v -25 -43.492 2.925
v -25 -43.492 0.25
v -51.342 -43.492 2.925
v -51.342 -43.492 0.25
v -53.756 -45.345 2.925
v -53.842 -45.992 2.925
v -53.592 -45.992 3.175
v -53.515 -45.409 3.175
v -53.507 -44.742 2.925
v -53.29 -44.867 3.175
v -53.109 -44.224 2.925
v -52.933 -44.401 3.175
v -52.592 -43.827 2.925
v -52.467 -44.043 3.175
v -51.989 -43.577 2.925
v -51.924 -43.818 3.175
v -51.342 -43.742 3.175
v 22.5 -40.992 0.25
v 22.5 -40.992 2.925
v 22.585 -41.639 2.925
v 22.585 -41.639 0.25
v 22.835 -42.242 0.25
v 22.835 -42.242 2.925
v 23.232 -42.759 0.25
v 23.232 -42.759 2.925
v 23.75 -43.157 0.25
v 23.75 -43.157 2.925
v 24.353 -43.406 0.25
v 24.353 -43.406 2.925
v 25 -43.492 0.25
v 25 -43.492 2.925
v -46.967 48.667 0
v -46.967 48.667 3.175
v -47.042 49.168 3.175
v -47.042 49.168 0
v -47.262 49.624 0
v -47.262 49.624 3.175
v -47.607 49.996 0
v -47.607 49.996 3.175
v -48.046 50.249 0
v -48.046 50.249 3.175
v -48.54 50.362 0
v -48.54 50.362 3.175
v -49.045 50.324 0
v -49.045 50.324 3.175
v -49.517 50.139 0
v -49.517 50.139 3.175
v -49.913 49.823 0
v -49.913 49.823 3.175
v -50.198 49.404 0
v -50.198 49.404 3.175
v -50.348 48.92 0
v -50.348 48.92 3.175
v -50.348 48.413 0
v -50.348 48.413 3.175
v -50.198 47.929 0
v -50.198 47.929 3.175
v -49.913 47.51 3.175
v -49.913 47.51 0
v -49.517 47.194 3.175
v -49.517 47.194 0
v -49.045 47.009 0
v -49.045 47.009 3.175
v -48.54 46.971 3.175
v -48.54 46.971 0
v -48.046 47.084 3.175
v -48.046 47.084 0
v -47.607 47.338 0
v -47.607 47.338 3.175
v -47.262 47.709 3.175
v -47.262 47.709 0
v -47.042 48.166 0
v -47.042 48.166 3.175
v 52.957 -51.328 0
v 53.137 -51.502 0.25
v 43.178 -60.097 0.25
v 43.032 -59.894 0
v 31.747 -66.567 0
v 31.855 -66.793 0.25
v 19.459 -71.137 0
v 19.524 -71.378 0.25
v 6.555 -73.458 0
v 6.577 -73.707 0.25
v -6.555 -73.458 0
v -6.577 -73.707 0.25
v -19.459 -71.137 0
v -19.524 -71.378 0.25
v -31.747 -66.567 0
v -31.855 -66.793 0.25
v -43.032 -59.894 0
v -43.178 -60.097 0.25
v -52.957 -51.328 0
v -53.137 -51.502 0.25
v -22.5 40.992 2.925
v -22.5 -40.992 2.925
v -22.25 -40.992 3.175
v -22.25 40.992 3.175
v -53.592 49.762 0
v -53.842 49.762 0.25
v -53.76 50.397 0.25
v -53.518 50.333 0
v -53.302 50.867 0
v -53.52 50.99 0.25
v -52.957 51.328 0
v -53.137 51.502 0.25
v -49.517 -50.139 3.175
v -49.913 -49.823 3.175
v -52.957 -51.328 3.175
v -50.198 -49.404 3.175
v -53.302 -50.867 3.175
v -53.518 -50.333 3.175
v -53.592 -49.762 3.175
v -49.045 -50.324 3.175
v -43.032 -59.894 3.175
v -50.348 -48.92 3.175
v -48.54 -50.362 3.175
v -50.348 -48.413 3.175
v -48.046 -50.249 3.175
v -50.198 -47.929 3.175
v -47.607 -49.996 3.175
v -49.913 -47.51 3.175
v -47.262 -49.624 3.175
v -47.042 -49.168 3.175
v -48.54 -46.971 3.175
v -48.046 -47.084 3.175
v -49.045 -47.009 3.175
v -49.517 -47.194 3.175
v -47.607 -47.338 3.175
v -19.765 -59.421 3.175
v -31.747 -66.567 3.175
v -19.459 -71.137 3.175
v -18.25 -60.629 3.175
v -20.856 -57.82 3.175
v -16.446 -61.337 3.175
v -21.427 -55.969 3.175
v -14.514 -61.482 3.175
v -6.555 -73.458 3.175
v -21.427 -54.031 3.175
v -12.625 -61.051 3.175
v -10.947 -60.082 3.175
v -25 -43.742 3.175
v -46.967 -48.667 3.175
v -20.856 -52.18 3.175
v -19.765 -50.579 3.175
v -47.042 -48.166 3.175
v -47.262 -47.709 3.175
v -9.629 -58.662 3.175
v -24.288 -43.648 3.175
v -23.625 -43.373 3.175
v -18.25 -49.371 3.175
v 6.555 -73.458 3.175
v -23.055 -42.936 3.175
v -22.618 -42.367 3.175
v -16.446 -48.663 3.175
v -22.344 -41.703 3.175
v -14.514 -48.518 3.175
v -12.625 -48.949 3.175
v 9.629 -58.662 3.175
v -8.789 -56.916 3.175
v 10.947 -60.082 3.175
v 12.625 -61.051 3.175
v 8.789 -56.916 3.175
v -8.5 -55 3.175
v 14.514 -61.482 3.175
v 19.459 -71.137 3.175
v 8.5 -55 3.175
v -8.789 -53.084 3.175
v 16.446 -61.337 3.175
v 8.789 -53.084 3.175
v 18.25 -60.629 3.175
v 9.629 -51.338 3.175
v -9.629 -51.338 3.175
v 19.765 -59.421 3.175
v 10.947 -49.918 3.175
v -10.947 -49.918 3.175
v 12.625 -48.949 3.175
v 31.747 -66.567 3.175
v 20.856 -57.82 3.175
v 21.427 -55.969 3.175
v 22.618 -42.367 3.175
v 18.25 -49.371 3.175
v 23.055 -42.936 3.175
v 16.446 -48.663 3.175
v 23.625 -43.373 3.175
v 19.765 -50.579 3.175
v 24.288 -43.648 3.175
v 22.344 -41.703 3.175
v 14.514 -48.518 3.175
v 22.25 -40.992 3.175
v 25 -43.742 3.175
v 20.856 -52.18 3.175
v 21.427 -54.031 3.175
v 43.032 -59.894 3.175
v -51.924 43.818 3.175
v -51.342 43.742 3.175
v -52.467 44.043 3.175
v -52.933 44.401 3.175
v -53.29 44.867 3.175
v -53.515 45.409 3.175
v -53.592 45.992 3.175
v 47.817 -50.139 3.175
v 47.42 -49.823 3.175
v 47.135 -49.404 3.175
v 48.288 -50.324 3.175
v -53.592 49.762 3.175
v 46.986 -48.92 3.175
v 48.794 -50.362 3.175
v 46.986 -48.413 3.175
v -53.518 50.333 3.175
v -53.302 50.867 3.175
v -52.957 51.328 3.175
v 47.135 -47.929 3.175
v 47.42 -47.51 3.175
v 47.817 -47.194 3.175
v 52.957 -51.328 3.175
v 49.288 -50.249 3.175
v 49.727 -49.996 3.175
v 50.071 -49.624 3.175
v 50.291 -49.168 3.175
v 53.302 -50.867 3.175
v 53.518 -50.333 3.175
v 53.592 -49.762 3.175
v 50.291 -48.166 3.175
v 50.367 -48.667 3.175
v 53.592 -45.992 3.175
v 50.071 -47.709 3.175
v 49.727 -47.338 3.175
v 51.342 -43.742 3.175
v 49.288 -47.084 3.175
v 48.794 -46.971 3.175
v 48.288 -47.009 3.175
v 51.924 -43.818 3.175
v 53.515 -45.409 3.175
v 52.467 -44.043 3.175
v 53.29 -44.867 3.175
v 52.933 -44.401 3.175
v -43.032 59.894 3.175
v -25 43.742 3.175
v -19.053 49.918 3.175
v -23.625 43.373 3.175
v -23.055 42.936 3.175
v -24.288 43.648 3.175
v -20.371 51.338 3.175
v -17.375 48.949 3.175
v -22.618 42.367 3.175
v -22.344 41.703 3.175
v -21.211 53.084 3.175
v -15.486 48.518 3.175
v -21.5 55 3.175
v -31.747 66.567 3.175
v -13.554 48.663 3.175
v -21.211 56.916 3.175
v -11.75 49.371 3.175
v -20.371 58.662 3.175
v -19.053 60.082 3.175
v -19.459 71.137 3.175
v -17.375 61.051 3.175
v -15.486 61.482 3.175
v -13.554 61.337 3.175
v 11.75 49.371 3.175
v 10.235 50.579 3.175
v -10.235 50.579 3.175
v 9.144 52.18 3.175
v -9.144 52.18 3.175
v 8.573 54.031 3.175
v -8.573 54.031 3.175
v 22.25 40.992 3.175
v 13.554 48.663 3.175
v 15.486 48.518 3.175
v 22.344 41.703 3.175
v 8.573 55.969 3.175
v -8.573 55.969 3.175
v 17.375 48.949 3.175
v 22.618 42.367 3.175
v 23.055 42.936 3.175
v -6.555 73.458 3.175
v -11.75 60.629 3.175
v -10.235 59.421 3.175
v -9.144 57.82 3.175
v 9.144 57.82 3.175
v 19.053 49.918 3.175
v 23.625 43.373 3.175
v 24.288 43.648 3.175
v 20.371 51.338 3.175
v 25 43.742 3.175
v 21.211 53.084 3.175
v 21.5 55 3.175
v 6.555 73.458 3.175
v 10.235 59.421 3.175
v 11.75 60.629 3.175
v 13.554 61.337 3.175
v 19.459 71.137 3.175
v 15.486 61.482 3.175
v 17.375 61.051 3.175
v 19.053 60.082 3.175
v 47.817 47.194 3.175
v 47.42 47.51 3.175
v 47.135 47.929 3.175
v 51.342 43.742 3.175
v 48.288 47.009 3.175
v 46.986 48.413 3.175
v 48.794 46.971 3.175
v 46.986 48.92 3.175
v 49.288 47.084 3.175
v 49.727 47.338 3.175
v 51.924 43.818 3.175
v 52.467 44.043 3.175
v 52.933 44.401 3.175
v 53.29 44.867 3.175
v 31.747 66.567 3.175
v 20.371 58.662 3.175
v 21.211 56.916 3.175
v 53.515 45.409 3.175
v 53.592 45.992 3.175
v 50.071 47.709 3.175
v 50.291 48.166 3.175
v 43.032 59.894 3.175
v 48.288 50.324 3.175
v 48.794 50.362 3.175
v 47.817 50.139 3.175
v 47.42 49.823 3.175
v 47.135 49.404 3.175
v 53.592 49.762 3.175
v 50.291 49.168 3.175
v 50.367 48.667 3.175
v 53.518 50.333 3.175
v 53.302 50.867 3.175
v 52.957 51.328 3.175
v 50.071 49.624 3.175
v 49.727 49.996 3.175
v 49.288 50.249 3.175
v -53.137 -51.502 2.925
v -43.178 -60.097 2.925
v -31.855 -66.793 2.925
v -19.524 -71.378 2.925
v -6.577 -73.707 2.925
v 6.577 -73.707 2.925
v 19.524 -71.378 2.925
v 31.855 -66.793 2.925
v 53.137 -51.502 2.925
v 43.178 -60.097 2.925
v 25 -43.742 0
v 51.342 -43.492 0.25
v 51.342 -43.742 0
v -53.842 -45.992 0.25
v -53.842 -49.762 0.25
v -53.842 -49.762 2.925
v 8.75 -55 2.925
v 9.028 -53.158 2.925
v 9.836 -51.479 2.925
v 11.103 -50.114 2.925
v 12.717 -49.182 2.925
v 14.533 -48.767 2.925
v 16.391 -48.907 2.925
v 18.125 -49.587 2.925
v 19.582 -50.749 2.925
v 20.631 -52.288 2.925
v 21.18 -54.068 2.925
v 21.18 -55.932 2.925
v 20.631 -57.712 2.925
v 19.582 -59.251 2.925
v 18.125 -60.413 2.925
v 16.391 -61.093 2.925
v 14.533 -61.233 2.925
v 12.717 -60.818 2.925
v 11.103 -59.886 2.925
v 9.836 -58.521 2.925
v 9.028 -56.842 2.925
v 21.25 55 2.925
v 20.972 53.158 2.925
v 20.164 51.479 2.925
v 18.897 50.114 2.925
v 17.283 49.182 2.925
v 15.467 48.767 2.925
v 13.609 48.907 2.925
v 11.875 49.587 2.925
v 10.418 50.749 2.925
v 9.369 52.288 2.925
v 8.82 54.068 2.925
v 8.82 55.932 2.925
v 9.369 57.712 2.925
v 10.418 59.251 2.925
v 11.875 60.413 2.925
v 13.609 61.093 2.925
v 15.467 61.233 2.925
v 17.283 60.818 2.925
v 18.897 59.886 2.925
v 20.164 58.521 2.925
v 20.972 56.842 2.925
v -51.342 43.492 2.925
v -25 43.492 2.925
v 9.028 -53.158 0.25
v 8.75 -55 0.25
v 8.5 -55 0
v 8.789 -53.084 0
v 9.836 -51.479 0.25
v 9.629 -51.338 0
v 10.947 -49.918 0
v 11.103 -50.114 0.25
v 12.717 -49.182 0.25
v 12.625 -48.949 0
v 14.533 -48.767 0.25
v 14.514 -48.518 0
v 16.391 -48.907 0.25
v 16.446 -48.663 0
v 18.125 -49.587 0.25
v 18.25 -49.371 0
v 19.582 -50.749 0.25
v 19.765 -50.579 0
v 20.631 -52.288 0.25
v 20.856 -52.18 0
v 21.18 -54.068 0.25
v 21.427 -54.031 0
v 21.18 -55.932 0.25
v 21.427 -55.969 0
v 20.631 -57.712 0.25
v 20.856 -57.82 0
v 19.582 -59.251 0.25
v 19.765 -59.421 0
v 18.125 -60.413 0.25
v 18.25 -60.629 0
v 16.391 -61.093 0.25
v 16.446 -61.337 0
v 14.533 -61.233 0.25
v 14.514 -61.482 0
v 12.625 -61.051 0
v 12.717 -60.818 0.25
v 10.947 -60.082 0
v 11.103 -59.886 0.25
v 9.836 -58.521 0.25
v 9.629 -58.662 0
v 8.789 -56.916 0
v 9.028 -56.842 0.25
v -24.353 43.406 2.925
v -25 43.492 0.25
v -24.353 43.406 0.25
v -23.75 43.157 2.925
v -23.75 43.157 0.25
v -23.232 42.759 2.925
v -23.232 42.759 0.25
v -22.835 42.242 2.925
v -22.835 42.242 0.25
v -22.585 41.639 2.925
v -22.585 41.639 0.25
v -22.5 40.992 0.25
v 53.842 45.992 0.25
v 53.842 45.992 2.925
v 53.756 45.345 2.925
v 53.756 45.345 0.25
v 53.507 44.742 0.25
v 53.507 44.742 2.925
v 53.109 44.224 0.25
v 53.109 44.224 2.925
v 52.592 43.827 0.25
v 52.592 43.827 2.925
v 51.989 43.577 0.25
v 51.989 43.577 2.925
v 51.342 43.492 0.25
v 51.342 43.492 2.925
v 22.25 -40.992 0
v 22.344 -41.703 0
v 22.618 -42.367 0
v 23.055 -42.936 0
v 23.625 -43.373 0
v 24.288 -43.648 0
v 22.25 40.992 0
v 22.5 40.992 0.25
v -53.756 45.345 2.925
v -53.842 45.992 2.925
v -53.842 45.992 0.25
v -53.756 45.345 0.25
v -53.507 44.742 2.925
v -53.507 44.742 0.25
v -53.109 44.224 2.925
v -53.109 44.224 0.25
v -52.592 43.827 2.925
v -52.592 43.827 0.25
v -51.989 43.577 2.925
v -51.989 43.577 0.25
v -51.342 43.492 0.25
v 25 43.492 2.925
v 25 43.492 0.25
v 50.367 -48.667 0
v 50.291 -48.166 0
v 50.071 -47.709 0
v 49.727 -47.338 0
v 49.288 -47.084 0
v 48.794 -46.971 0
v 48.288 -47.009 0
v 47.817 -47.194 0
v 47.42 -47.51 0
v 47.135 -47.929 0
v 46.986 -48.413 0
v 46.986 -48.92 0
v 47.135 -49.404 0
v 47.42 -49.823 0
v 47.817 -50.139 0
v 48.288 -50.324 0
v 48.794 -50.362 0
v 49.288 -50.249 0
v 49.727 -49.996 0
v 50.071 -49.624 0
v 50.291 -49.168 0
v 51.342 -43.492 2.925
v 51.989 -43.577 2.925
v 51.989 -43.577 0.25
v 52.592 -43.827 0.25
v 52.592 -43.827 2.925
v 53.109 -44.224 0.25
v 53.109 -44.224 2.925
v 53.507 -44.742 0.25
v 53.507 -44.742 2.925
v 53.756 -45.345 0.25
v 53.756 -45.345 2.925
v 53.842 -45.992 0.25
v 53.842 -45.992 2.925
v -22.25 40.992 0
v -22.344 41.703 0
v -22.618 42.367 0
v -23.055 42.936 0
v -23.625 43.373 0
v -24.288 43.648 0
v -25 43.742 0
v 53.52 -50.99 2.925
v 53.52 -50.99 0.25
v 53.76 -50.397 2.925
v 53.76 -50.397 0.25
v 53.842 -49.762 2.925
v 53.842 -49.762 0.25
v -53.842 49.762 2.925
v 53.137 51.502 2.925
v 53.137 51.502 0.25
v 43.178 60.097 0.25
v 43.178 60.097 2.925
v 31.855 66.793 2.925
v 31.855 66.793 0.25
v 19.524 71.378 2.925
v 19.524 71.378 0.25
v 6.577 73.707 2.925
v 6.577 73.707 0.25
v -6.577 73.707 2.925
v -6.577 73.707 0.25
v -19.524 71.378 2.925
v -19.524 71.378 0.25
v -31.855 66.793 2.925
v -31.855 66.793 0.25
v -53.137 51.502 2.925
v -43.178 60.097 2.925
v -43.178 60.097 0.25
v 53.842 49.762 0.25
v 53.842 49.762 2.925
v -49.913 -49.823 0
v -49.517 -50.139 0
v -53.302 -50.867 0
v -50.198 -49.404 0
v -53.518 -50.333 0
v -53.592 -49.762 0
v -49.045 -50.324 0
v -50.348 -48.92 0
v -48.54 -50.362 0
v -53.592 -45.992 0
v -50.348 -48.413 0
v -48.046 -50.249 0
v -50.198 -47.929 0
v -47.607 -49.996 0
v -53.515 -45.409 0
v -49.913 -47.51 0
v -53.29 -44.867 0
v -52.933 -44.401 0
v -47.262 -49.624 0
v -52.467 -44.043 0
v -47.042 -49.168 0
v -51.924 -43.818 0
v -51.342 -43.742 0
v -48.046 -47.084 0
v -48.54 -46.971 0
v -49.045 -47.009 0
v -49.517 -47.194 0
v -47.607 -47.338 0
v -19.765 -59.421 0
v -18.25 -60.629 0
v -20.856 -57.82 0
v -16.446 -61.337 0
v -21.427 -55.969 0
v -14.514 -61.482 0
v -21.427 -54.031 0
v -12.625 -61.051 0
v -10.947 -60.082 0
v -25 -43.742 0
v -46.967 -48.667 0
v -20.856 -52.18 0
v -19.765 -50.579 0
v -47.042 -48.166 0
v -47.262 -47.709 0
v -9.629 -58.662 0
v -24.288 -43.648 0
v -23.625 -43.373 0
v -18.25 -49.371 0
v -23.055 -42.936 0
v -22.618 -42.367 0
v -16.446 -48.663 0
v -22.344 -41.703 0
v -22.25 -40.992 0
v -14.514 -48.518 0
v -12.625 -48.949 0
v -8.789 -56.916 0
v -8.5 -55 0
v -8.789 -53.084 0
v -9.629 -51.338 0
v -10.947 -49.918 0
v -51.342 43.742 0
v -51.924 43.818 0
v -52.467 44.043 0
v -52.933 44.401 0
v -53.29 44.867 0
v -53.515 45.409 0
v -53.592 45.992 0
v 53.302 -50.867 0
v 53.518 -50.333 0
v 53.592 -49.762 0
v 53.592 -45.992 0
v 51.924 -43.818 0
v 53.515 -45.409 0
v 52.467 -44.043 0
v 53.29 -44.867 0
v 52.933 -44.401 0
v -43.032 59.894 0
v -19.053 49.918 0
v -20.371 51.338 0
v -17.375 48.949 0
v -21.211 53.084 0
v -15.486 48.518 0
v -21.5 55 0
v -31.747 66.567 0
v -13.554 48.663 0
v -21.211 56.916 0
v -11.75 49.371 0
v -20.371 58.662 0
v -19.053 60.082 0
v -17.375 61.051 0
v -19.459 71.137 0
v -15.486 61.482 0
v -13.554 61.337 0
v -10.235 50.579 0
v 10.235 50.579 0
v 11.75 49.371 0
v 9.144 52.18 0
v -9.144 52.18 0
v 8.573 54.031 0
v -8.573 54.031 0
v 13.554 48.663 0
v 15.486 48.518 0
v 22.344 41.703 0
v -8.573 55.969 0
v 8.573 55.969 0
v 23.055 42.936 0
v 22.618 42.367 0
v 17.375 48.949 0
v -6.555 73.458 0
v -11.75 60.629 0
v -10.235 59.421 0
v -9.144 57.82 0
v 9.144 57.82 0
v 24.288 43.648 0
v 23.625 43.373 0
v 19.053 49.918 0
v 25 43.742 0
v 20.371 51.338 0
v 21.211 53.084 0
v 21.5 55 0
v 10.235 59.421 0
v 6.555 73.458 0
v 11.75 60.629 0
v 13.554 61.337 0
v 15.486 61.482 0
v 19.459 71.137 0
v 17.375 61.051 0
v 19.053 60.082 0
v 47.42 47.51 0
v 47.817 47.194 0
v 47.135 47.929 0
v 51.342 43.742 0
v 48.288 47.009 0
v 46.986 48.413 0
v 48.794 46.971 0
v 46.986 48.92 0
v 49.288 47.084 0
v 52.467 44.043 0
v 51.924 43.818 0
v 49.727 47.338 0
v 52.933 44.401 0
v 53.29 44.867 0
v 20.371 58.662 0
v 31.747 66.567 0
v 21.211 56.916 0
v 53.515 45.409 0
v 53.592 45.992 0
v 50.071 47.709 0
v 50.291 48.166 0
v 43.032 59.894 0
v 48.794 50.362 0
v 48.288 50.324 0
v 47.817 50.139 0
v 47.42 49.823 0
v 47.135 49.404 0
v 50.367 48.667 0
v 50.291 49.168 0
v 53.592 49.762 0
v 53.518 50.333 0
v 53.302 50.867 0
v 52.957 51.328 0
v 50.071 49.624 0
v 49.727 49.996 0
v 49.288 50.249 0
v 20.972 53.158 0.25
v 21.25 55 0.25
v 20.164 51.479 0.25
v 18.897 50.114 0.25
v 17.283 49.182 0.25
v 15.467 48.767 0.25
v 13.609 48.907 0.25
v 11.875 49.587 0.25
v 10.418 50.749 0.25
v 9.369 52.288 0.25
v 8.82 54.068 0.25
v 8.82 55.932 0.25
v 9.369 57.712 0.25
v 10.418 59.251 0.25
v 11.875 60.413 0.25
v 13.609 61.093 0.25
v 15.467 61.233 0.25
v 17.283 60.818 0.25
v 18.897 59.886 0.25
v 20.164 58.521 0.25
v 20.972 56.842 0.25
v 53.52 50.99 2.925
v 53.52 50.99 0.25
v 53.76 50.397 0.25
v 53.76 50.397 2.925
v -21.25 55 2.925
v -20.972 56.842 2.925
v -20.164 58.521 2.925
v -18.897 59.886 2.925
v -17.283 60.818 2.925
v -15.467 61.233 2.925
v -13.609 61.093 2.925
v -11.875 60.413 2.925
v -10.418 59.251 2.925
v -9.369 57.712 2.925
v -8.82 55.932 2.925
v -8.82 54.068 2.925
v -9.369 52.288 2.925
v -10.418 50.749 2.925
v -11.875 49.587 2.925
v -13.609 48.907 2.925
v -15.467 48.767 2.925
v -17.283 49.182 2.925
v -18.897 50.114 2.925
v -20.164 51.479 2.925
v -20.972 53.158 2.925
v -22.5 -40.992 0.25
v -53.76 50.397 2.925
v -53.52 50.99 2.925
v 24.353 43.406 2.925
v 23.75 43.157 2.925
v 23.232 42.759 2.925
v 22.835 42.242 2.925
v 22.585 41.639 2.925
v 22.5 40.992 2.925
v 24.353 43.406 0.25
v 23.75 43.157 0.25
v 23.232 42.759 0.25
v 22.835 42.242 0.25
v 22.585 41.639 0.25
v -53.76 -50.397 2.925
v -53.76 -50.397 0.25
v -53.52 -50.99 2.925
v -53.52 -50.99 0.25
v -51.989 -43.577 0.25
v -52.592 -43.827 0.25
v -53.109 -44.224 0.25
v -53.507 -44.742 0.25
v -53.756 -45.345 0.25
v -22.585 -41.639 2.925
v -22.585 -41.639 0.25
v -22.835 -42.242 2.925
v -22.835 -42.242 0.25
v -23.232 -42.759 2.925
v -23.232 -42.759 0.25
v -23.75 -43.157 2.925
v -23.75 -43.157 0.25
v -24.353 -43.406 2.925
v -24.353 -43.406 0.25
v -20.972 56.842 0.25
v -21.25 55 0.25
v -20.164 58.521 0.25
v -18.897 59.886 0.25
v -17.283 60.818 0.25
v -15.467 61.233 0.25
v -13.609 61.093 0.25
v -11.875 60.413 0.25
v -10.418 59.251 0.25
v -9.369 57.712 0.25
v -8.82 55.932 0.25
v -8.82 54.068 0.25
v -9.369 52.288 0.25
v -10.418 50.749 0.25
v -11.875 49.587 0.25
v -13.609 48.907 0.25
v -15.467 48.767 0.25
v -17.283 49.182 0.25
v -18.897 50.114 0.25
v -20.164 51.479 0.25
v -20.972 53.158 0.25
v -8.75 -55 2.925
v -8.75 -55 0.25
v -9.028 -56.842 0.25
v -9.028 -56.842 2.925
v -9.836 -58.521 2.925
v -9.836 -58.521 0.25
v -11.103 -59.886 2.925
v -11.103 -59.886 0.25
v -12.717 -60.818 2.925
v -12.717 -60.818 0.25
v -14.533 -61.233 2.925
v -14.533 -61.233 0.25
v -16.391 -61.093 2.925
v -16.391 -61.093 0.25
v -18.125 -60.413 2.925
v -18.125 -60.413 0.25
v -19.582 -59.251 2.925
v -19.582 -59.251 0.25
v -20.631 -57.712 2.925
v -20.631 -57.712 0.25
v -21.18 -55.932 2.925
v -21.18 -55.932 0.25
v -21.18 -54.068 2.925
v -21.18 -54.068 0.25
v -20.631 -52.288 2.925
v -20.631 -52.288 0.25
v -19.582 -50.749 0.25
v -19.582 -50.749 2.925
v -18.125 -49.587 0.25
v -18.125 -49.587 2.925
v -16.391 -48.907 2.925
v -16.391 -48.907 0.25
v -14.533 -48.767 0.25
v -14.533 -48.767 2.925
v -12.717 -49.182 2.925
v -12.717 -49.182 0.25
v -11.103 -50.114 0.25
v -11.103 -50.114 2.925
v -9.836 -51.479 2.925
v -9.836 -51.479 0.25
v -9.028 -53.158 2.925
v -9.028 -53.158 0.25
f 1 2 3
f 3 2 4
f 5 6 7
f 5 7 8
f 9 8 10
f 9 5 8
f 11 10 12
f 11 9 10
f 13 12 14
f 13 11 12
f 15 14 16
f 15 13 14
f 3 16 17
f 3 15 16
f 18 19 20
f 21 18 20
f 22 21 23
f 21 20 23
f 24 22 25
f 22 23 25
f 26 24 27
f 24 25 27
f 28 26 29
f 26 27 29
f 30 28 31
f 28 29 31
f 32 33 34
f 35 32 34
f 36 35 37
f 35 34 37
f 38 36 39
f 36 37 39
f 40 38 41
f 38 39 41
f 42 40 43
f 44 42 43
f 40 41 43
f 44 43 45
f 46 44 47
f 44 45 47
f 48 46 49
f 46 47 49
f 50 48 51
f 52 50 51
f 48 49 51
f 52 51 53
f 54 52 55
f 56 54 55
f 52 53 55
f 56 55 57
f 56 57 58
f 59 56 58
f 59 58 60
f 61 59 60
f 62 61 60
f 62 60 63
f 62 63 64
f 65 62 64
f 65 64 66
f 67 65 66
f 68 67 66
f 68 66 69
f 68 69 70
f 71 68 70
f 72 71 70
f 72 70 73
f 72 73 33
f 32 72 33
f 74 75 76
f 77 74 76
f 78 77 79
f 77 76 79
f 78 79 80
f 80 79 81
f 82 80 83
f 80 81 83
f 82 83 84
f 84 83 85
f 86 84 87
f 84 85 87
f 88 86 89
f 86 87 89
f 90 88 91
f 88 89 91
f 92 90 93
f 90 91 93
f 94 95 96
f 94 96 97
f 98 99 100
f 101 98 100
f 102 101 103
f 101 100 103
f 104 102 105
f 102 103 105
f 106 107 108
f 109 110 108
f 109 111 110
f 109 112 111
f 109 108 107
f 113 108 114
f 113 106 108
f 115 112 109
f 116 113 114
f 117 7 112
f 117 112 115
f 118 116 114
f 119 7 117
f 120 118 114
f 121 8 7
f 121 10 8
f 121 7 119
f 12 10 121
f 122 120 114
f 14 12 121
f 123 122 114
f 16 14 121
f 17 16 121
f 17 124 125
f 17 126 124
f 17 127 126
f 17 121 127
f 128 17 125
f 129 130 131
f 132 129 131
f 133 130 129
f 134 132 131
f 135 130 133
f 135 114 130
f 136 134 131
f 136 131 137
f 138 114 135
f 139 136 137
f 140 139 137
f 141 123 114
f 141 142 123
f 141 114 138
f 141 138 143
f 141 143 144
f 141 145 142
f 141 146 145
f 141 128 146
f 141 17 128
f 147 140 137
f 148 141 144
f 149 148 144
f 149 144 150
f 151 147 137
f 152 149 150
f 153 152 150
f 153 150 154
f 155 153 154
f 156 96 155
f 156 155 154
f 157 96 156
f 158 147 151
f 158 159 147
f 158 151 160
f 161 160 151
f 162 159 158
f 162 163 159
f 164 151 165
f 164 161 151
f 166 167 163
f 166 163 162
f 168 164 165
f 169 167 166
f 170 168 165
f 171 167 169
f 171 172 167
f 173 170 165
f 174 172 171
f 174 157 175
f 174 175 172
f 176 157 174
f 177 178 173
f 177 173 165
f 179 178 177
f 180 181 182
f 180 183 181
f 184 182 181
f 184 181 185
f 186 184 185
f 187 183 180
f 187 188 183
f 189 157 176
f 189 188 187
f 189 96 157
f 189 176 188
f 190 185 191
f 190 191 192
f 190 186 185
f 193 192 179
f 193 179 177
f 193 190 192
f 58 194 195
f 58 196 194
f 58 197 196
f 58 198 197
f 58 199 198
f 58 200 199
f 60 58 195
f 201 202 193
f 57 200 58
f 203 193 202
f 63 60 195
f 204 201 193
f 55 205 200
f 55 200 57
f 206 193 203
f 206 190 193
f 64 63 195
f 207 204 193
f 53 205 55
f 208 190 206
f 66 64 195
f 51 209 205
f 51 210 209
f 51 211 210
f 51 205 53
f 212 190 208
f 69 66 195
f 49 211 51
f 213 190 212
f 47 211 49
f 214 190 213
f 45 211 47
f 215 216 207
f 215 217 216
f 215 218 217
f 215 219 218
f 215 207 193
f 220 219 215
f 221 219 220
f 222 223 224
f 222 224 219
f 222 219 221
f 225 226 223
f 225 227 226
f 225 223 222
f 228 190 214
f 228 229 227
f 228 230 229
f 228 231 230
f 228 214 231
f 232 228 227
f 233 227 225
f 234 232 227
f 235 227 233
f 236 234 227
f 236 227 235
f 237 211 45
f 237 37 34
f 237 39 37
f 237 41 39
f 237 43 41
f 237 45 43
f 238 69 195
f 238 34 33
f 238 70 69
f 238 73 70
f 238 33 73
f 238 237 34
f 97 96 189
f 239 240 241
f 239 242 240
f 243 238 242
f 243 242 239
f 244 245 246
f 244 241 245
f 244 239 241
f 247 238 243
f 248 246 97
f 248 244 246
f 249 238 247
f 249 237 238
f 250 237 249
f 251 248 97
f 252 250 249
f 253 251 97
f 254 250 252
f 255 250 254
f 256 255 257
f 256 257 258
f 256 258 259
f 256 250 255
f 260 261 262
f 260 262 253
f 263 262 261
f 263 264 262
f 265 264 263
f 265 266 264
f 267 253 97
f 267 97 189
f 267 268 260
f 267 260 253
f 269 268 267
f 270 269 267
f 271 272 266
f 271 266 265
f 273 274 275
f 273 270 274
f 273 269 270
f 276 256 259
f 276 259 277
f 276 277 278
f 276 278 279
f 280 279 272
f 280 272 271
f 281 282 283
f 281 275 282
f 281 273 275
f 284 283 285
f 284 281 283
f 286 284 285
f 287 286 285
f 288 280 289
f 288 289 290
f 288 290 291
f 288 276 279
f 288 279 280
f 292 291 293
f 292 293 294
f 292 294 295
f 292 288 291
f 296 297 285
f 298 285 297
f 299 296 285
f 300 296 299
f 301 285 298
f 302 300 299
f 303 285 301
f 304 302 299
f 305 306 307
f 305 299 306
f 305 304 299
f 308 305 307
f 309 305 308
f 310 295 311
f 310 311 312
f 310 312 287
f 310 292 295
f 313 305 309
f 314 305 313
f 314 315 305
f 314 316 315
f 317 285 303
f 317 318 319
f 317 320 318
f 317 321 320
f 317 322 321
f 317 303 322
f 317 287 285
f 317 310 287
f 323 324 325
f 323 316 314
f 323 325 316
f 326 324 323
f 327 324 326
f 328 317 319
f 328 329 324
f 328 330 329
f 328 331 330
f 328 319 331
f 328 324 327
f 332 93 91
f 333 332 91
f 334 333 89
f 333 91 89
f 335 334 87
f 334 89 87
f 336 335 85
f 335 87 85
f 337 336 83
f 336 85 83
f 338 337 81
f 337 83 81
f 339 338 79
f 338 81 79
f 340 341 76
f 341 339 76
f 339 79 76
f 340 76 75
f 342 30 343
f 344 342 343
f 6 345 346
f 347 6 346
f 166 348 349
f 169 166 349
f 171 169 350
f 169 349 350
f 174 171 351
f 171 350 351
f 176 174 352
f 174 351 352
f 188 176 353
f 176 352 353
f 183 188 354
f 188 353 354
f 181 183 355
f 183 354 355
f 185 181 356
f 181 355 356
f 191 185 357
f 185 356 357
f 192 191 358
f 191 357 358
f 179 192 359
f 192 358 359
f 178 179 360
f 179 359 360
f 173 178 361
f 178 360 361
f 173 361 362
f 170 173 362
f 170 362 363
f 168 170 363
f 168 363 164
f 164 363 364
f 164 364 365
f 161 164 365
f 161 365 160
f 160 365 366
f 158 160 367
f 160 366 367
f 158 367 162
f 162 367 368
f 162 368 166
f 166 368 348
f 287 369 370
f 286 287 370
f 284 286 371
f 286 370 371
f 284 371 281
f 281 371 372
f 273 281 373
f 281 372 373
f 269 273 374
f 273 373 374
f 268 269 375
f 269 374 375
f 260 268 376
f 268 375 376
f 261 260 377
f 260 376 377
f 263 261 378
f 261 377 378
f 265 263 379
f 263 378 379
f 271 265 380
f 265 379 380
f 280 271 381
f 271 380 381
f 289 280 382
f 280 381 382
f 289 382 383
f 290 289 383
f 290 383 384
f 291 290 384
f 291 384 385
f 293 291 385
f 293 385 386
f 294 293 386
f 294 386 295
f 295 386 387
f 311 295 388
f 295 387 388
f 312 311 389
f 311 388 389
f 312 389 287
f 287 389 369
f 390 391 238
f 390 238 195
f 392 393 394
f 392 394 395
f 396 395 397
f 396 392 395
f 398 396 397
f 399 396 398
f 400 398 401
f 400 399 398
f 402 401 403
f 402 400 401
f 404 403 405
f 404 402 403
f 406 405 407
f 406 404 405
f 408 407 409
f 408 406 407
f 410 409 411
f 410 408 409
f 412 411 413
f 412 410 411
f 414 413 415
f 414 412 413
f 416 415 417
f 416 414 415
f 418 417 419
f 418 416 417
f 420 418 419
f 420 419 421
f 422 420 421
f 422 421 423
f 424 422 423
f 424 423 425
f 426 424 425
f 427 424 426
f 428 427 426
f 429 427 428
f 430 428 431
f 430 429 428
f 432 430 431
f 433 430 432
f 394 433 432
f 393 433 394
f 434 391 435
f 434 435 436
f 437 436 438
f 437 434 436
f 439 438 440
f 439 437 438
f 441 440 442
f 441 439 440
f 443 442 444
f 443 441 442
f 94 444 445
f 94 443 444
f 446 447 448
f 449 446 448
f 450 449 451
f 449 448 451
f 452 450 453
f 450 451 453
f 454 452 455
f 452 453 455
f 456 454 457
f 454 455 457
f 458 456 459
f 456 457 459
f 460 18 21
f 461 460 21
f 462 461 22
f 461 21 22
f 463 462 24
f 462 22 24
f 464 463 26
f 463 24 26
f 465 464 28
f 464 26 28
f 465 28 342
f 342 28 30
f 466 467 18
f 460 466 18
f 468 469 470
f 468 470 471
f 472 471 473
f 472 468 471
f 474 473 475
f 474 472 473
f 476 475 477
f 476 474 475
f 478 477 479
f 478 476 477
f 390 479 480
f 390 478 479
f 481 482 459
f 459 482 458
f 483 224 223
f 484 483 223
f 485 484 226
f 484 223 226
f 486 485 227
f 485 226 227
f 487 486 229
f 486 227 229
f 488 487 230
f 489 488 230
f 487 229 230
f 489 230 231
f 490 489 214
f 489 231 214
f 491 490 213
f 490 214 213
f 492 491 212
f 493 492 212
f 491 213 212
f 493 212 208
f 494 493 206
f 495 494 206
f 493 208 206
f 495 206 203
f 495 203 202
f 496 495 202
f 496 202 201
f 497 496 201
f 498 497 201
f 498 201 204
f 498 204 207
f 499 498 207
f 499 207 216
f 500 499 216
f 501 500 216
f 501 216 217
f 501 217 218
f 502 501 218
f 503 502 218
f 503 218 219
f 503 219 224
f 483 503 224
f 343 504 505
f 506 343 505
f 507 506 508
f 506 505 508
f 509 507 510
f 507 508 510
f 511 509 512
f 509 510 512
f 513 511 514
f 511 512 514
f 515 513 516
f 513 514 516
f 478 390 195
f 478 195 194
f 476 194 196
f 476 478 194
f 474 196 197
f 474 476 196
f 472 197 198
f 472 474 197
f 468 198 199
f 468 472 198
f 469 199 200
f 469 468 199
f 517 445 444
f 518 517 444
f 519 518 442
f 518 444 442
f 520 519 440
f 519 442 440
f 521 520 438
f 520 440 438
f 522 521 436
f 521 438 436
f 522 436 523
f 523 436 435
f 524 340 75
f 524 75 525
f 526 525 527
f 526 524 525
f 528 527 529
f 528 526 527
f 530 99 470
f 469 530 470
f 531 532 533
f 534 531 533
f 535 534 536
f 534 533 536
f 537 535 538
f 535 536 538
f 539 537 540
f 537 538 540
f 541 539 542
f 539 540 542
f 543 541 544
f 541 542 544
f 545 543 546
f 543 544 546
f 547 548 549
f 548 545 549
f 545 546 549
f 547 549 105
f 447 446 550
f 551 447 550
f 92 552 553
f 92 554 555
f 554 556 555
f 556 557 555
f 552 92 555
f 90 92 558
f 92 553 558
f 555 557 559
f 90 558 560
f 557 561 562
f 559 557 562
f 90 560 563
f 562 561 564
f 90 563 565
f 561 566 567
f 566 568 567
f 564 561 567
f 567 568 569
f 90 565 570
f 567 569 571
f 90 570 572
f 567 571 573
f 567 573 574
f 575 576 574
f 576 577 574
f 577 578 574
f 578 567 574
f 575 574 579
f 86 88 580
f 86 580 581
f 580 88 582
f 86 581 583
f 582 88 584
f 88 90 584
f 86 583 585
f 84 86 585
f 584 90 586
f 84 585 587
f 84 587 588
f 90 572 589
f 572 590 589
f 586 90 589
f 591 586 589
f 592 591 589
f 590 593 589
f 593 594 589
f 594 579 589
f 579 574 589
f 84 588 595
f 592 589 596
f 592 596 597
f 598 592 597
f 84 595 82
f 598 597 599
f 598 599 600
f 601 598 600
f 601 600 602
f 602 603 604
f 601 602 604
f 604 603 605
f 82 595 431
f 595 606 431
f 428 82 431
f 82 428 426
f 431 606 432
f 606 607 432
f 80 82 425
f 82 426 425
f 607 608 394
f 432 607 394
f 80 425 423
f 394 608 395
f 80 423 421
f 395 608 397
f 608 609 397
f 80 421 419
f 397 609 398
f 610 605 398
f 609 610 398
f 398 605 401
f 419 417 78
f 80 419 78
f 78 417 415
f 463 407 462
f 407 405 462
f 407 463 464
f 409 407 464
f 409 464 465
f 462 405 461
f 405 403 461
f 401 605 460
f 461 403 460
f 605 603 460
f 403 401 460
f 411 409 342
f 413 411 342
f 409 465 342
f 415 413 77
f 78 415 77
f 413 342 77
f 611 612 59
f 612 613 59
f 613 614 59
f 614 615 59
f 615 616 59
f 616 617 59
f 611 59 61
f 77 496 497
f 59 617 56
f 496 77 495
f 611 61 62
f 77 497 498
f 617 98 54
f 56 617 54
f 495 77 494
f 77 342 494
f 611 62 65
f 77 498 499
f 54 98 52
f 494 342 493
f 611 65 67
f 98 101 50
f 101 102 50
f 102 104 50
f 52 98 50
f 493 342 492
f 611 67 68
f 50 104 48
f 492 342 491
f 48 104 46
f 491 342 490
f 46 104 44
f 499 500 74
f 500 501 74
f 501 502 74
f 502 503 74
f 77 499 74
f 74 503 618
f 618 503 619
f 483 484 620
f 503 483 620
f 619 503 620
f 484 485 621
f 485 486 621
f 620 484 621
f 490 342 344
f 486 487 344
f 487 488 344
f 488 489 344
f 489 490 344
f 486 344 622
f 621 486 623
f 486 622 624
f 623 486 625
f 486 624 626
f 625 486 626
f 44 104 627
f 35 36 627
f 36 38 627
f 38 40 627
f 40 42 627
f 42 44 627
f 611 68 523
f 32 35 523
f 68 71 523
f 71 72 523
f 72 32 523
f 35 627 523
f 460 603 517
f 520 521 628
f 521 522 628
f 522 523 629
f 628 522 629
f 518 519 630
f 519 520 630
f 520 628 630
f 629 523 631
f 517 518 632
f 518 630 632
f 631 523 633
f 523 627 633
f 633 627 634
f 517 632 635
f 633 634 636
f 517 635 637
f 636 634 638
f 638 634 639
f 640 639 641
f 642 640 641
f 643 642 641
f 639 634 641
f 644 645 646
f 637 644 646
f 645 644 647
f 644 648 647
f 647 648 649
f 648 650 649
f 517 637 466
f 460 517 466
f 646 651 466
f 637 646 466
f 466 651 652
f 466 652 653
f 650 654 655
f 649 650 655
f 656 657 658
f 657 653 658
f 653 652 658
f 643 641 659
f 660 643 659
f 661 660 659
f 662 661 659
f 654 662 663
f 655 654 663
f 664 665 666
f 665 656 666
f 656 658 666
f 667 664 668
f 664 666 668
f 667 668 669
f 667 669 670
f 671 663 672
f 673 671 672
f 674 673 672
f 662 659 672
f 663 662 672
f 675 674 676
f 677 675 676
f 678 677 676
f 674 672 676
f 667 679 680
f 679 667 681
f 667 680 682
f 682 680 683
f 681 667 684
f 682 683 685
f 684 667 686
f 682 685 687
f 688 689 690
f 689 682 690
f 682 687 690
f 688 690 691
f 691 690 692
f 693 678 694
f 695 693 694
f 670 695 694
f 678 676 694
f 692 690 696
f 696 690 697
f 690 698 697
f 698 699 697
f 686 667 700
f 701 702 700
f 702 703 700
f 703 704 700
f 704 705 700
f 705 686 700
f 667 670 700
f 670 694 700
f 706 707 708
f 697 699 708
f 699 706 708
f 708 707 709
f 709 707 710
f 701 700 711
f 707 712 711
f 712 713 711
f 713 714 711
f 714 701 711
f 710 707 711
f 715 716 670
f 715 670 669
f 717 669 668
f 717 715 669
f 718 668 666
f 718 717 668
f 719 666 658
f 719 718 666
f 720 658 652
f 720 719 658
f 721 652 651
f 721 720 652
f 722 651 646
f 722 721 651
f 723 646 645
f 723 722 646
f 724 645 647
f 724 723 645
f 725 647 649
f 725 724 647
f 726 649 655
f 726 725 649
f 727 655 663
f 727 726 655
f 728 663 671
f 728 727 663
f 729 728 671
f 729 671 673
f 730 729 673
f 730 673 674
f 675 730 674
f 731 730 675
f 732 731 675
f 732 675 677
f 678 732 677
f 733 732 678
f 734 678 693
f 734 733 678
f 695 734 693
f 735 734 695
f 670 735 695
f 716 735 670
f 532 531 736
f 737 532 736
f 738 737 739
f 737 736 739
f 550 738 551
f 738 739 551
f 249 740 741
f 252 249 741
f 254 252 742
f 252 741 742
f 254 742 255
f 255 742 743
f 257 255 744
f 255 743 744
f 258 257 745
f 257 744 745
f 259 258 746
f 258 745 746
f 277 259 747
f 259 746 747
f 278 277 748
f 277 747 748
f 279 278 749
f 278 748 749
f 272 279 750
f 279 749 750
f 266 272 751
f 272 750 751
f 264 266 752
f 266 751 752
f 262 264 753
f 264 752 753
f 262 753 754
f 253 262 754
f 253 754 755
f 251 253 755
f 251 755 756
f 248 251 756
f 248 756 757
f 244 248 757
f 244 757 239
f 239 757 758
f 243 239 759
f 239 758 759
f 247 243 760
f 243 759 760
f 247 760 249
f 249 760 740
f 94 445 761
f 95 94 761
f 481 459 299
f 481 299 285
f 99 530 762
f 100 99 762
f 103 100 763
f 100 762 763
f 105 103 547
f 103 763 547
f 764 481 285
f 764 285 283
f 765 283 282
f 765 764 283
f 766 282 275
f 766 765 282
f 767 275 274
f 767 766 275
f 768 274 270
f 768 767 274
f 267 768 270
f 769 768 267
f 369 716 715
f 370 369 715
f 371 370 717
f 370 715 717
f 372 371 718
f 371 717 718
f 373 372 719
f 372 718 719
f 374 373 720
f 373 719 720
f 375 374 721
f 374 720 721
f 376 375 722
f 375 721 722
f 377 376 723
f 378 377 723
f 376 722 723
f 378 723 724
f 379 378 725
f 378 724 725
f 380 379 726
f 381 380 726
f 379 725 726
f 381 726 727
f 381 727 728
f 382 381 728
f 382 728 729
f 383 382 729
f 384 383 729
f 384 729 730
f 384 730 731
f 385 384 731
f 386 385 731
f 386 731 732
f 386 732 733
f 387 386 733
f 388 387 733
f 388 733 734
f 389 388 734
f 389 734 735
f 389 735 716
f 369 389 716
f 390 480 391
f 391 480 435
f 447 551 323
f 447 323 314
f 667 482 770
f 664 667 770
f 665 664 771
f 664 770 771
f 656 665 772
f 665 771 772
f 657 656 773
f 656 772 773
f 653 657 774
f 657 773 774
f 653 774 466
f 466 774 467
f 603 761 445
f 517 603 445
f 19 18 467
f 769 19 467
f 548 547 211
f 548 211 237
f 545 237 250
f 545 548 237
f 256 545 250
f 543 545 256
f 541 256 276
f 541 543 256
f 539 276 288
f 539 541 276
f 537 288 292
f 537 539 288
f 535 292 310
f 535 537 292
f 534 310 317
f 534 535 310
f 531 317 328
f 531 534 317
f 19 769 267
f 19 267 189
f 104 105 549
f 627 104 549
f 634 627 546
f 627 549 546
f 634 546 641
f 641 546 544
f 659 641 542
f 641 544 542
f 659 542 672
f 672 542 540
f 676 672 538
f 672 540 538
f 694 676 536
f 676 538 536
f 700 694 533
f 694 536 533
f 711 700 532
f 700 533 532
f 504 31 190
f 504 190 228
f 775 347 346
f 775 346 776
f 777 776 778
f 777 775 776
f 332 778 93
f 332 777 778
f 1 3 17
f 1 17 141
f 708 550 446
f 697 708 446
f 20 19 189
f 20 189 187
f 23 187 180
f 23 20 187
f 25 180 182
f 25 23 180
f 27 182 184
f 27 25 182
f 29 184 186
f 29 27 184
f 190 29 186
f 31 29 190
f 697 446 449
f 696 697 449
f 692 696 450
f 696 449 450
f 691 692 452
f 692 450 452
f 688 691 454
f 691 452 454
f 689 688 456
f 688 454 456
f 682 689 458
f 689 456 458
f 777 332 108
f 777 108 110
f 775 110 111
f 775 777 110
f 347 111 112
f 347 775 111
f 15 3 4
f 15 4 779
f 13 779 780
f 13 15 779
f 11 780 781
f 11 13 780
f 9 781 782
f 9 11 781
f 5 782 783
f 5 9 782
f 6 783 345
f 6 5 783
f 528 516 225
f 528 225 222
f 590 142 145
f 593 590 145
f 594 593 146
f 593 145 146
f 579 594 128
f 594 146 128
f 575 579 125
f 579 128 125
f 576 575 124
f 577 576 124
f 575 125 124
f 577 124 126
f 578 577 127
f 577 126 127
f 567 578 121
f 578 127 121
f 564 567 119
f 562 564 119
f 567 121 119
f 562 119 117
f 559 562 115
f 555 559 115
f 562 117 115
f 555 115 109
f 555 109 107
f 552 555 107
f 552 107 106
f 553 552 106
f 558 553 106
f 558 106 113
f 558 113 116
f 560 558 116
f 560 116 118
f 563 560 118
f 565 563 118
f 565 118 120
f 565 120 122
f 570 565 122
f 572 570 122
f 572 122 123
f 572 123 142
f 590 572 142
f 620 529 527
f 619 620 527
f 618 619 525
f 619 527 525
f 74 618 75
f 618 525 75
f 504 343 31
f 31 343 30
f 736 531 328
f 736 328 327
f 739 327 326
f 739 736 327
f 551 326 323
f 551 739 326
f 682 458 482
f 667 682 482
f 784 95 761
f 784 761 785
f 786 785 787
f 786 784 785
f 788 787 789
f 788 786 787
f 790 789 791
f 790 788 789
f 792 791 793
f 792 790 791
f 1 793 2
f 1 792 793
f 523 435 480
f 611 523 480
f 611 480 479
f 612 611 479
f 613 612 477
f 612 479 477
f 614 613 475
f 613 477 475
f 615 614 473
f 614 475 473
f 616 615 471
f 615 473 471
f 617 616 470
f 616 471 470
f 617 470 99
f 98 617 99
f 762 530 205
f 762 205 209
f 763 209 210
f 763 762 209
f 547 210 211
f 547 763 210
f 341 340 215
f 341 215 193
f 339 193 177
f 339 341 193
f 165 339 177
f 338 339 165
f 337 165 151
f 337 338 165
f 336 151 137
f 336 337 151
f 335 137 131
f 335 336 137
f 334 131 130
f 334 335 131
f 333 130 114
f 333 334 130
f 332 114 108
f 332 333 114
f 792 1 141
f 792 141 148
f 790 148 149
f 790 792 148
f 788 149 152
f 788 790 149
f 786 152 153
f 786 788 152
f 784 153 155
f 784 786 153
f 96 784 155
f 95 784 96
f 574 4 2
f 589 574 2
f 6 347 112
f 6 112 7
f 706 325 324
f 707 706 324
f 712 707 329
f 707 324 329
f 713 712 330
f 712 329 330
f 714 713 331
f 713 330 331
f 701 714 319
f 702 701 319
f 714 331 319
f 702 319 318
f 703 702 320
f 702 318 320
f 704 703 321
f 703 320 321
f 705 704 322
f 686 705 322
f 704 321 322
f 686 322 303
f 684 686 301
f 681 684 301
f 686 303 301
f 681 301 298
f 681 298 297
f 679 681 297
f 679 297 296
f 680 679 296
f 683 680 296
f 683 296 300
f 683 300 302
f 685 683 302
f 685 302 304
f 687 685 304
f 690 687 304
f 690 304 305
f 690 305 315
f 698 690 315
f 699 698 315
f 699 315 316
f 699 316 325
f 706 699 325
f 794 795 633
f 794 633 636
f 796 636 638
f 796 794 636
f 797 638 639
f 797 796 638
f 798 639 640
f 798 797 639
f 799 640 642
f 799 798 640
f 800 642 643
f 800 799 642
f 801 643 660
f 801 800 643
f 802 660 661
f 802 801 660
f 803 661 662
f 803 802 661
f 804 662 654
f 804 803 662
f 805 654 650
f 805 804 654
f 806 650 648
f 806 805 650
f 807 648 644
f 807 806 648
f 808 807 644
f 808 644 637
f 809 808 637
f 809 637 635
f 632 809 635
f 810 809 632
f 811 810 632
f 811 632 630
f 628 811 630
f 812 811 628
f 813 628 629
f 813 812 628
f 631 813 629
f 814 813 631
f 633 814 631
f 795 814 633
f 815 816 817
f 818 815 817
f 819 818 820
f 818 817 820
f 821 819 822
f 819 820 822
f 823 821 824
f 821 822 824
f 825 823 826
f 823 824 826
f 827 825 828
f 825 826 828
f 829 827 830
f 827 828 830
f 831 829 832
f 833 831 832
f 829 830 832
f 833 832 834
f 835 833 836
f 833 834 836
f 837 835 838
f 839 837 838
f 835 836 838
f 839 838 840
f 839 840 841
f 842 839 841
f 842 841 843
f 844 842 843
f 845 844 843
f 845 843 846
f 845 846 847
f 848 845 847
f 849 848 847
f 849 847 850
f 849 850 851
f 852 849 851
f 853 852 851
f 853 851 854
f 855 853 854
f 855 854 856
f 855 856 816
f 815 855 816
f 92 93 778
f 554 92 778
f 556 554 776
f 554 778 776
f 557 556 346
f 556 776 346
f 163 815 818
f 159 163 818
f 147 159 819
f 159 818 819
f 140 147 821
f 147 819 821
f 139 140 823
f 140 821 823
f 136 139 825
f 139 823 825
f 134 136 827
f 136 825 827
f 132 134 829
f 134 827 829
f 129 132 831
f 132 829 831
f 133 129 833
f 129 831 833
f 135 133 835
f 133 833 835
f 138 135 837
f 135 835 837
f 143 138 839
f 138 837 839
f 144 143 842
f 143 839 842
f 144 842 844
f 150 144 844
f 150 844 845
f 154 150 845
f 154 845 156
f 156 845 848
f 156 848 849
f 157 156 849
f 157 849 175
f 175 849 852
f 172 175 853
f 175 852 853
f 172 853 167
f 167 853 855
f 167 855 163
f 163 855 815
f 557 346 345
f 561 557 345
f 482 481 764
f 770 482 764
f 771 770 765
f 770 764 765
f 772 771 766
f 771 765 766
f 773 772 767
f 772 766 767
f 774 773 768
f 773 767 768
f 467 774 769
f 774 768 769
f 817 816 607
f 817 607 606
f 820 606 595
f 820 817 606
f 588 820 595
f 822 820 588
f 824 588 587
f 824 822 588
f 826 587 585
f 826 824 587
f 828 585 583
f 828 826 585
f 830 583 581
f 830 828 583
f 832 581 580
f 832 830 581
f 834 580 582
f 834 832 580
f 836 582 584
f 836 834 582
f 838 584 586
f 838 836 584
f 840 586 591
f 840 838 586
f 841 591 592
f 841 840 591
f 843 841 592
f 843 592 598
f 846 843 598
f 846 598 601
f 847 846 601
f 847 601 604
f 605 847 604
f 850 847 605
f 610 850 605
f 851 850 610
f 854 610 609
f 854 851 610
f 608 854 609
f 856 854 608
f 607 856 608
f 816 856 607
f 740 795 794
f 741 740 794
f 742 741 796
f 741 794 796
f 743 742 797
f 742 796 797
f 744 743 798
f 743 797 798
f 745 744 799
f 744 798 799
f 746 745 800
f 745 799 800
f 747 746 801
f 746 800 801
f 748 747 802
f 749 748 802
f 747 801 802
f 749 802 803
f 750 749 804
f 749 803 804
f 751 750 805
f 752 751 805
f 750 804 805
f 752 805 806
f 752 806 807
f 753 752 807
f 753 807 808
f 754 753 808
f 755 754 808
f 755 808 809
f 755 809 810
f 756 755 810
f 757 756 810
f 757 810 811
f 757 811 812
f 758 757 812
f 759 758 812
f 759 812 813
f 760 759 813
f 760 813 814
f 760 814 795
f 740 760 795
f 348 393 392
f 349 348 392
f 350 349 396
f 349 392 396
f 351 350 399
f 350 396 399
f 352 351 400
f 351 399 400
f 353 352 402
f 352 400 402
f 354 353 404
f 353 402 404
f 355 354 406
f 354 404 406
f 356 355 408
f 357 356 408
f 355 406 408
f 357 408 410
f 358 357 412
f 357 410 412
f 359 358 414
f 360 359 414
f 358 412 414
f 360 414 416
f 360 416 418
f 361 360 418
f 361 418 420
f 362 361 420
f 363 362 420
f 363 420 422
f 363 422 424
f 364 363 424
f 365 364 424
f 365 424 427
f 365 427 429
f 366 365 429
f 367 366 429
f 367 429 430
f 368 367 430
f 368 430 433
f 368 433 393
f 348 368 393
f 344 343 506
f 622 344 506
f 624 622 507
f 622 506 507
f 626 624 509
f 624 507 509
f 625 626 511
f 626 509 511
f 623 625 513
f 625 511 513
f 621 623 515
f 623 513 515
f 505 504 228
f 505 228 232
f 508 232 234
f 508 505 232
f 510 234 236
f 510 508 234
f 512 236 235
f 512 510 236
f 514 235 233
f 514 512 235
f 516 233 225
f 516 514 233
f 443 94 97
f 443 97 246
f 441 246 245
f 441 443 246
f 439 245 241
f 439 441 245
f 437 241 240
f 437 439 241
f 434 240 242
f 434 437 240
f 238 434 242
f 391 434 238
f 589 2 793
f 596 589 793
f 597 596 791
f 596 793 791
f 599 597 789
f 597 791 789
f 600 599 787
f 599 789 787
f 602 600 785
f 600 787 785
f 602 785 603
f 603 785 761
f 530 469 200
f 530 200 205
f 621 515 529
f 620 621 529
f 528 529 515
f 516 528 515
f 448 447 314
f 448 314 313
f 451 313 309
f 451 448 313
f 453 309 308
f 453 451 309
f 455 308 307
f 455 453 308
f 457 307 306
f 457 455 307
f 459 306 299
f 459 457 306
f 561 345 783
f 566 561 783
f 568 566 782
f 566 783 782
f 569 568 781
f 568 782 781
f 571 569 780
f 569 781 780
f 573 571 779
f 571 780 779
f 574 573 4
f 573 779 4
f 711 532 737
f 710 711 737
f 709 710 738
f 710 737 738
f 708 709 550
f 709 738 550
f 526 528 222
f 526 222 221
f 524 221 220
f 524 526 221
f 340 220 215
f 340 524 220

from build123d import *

# Parameters (mm, degrees)
BOSS_EXTRUDE1_DEPTH  = 3.175
M3_CLEARANCE_HOLE1_D = 3.4
SKETCH7_R            = 6.25
CUT_EXTRUDE3_DEPTH   = 92.569651758
FILLET1_R            = 2.5
CHAMFER1_SIZE        = 0.25


with BuildPart() as part:
    # Sketch1 → Boss-Extrude1 (new body)
    with BuildSketch(Plane.XY):
        with BuildLine():
            Line((-53.841624215, 50.764943631), (-53.841624215, 43.491624215))
            Line((-53.841624215, 43.491624215), (-22.5, 43.491624215))
            Line((-22.5, 43.491624215), (-22.5, -43.491624215))
            Line((-22.5, -43.491624215), (-53.841624215, -43.491624215))
            Line((-53.841624215, -43.491624215), (-53.841624215, -50.764943631))
            ThreePointArc((-53.841624215, -50.764943631), (0, -74), (53.841624215, -50.764943631))
            Line((53.841624215, -50.764943631), (53.841624215, -43.491624215))
            Line((53.841624215, -43.491624215), (22.5, -43.491624215))
            Line((22.5, -43.491624215), (22.5, 43.491624215))
            Line((22.5, 43.491624215), (53.841624215, 43.491624215))
            Line((53.841624215, 43.491624215), (53.841624215, 50.764943631))
            ThreePointArc((53.841624215, 50.764943631), (0, 74), (-53.841624215, 50.764943631))
        make_face()
    extrude(amount=BOSS_EXTRUDE1_DEPTH)

    # M3 Clearance Hole1 (through all)
    with Locations(Plane(origin=(48.666624215, 48.666624215, 0), x_dir=(-1, 0, 0), z_dir=(0, 0, -1))):
        with Locations((0, 0), (97.33324843, 0), (97.33324843, -97.33324843), (0, -97.33324843)):
            Hole(M3_CLEARANCE_HOLE1_D / 2)

    # Sketch7 → Cut-Extrude3 (cut, through all)
    with BuildSketch(Plane(origin=(0, 0, 0), x_dir=(-1, 0, 0), z_dir=(0, 0, -1))):
        with Locations((15, 55)):
            Circle(SKETCH7_R)
        with Locations(Location((-15, 55, 0), (0, 0, 180))):
            Circle(SKETCH7_R)
        with Locations((-15, -55)):
            Circle(SKETCH7_R)
        with Locations(Location((15, -55, 0), (0, 0, 180))):
            Circle(SKETCH7_R)
    extrude(amount=-CUT_EXTRUDE3_DEPTH, mode=Mode.SUBTRACT)

    # Fillet1
    fillet1_edges = [part.edges().sort_by_distance(p)[0] for p in [
        (53.841624215, 50.764943631, 1.5875),
        (53.841624215, 43.491624215, 1.5875),
        (22.5, 43.491624215, 1.5875),
        (22.5, -43.491624215, 1.5875),
        (53.841624215, -43.491624215, 1.5875),
        (53.841624215, -50.764943631, 1.5875),
        (-53.841624215, -50.764943631, 1.5875),
        (-53.841624215, -43.491624215, 1.5875),
        (-22.5, -43.491624215, 1.5875),
        (-22.5, 43.491624215, 1.5875),
        (-53.841624215, 43.491624215, 1.5875),
        (-53.841624215, 50.764943631, 1.5875),
    ]]
    fillet(fillet1_edges, radius=FILLET1_R)

    # Chamfer1
    chamfer1_edges = [part.edges().sort_by_distance(p)[0] for p in [
        (23.232233047, 42.759391168, 0),
        (23.232233047, 42.759391168, 3.175),
        (23.232233047, -42.759391168, 0),
        (23.232233047, -42.759391168, 3.175),
        (-23.232233047, -42.759391168, 0),
        (-23.232233047, -42.759391168, 3.175),
        (-23.232233047, 42.759391168, 0),
        (-23.232233047, 42.759391168, 3.175),
        (-21.25, -55, 3.175),
        (-21.25, -55, 0),
        (21.25, -55, 3.175),
        (21.25, -55, 0),
        (8.75, 55, 3.175),
        (8.75, 55, 0),
        (-8.75, 55, 3.175),
        (-8.75, 55, 0),
        (0, 74, 0),
        (0, 74, 3.175),
        (53.841624215, 47.876967743, 0),
        (38.170812108, 43.491624215, 0),
        (22.5, 0, 0),
        (38.170812108, -43.491624215, 0),
        (53.841624215, -47.876967743, 0),
        (0, -74, 0),
        (-53.841624215, -47.876967743, 0),
        (-38.170812108, -43.491624215, 0),
        (-22.5, 0, 0),
        (-38.170812108, 43.491624215, 0),
        (-53.841624215, 47.876967743, 0),
        (-53.65872415, -50.700952785, 0),
        (-53.65872415, 50.700952785, 0),
        (-53.109391168, 44.223857262, 0),
        (-53.109391168, -44.223857262, 0),
        (53.65872415, -50.700952785, 0),
        (53.109391168, -44.223857262, 0),
        (53.109391168, 44.223857262, 0),
        (53.65872415, 50.700952785, 0),
        (53.841624215, 47.876967743, 3.175),
        (-53.841624215, 47.876967743, 3.175),
        (-38.170812108, 43.491624215, 3.175),
        (-22.5, 0, 3.175),
        (-38.170812108, -43.491624215, 3.175),
        (-53.841624215, -47.876967743, 3.175),
        (0, -74, 3.175),
        (53.841624215, -47.876967743, 3.175),
        (38.170812108, -43.491624215, 3.175),
        (22.5, 0, 3.175),
        (38.170812108, 43.491624215, 3.175),
        (-53.65872415, -50.700952785, 3.175),
        (-53.65872415, 50.700952785, 3.175),
        (-53.109391168, 44.223857262, 3.175),
        (-53.109391168, -44.223857262, 3.175),
        (53.65872415, -50.700952785, 3.175),
        (53.109391168, -44.223857262, 3.175),
        (53.109391168, 44.223857262, 3.175),
        (53.65872415, 50.700952785, 3.175),
    ]]
    chamfer(chamfer1_edges, length=CHAMFER1_SIZE)


solid = part.part
